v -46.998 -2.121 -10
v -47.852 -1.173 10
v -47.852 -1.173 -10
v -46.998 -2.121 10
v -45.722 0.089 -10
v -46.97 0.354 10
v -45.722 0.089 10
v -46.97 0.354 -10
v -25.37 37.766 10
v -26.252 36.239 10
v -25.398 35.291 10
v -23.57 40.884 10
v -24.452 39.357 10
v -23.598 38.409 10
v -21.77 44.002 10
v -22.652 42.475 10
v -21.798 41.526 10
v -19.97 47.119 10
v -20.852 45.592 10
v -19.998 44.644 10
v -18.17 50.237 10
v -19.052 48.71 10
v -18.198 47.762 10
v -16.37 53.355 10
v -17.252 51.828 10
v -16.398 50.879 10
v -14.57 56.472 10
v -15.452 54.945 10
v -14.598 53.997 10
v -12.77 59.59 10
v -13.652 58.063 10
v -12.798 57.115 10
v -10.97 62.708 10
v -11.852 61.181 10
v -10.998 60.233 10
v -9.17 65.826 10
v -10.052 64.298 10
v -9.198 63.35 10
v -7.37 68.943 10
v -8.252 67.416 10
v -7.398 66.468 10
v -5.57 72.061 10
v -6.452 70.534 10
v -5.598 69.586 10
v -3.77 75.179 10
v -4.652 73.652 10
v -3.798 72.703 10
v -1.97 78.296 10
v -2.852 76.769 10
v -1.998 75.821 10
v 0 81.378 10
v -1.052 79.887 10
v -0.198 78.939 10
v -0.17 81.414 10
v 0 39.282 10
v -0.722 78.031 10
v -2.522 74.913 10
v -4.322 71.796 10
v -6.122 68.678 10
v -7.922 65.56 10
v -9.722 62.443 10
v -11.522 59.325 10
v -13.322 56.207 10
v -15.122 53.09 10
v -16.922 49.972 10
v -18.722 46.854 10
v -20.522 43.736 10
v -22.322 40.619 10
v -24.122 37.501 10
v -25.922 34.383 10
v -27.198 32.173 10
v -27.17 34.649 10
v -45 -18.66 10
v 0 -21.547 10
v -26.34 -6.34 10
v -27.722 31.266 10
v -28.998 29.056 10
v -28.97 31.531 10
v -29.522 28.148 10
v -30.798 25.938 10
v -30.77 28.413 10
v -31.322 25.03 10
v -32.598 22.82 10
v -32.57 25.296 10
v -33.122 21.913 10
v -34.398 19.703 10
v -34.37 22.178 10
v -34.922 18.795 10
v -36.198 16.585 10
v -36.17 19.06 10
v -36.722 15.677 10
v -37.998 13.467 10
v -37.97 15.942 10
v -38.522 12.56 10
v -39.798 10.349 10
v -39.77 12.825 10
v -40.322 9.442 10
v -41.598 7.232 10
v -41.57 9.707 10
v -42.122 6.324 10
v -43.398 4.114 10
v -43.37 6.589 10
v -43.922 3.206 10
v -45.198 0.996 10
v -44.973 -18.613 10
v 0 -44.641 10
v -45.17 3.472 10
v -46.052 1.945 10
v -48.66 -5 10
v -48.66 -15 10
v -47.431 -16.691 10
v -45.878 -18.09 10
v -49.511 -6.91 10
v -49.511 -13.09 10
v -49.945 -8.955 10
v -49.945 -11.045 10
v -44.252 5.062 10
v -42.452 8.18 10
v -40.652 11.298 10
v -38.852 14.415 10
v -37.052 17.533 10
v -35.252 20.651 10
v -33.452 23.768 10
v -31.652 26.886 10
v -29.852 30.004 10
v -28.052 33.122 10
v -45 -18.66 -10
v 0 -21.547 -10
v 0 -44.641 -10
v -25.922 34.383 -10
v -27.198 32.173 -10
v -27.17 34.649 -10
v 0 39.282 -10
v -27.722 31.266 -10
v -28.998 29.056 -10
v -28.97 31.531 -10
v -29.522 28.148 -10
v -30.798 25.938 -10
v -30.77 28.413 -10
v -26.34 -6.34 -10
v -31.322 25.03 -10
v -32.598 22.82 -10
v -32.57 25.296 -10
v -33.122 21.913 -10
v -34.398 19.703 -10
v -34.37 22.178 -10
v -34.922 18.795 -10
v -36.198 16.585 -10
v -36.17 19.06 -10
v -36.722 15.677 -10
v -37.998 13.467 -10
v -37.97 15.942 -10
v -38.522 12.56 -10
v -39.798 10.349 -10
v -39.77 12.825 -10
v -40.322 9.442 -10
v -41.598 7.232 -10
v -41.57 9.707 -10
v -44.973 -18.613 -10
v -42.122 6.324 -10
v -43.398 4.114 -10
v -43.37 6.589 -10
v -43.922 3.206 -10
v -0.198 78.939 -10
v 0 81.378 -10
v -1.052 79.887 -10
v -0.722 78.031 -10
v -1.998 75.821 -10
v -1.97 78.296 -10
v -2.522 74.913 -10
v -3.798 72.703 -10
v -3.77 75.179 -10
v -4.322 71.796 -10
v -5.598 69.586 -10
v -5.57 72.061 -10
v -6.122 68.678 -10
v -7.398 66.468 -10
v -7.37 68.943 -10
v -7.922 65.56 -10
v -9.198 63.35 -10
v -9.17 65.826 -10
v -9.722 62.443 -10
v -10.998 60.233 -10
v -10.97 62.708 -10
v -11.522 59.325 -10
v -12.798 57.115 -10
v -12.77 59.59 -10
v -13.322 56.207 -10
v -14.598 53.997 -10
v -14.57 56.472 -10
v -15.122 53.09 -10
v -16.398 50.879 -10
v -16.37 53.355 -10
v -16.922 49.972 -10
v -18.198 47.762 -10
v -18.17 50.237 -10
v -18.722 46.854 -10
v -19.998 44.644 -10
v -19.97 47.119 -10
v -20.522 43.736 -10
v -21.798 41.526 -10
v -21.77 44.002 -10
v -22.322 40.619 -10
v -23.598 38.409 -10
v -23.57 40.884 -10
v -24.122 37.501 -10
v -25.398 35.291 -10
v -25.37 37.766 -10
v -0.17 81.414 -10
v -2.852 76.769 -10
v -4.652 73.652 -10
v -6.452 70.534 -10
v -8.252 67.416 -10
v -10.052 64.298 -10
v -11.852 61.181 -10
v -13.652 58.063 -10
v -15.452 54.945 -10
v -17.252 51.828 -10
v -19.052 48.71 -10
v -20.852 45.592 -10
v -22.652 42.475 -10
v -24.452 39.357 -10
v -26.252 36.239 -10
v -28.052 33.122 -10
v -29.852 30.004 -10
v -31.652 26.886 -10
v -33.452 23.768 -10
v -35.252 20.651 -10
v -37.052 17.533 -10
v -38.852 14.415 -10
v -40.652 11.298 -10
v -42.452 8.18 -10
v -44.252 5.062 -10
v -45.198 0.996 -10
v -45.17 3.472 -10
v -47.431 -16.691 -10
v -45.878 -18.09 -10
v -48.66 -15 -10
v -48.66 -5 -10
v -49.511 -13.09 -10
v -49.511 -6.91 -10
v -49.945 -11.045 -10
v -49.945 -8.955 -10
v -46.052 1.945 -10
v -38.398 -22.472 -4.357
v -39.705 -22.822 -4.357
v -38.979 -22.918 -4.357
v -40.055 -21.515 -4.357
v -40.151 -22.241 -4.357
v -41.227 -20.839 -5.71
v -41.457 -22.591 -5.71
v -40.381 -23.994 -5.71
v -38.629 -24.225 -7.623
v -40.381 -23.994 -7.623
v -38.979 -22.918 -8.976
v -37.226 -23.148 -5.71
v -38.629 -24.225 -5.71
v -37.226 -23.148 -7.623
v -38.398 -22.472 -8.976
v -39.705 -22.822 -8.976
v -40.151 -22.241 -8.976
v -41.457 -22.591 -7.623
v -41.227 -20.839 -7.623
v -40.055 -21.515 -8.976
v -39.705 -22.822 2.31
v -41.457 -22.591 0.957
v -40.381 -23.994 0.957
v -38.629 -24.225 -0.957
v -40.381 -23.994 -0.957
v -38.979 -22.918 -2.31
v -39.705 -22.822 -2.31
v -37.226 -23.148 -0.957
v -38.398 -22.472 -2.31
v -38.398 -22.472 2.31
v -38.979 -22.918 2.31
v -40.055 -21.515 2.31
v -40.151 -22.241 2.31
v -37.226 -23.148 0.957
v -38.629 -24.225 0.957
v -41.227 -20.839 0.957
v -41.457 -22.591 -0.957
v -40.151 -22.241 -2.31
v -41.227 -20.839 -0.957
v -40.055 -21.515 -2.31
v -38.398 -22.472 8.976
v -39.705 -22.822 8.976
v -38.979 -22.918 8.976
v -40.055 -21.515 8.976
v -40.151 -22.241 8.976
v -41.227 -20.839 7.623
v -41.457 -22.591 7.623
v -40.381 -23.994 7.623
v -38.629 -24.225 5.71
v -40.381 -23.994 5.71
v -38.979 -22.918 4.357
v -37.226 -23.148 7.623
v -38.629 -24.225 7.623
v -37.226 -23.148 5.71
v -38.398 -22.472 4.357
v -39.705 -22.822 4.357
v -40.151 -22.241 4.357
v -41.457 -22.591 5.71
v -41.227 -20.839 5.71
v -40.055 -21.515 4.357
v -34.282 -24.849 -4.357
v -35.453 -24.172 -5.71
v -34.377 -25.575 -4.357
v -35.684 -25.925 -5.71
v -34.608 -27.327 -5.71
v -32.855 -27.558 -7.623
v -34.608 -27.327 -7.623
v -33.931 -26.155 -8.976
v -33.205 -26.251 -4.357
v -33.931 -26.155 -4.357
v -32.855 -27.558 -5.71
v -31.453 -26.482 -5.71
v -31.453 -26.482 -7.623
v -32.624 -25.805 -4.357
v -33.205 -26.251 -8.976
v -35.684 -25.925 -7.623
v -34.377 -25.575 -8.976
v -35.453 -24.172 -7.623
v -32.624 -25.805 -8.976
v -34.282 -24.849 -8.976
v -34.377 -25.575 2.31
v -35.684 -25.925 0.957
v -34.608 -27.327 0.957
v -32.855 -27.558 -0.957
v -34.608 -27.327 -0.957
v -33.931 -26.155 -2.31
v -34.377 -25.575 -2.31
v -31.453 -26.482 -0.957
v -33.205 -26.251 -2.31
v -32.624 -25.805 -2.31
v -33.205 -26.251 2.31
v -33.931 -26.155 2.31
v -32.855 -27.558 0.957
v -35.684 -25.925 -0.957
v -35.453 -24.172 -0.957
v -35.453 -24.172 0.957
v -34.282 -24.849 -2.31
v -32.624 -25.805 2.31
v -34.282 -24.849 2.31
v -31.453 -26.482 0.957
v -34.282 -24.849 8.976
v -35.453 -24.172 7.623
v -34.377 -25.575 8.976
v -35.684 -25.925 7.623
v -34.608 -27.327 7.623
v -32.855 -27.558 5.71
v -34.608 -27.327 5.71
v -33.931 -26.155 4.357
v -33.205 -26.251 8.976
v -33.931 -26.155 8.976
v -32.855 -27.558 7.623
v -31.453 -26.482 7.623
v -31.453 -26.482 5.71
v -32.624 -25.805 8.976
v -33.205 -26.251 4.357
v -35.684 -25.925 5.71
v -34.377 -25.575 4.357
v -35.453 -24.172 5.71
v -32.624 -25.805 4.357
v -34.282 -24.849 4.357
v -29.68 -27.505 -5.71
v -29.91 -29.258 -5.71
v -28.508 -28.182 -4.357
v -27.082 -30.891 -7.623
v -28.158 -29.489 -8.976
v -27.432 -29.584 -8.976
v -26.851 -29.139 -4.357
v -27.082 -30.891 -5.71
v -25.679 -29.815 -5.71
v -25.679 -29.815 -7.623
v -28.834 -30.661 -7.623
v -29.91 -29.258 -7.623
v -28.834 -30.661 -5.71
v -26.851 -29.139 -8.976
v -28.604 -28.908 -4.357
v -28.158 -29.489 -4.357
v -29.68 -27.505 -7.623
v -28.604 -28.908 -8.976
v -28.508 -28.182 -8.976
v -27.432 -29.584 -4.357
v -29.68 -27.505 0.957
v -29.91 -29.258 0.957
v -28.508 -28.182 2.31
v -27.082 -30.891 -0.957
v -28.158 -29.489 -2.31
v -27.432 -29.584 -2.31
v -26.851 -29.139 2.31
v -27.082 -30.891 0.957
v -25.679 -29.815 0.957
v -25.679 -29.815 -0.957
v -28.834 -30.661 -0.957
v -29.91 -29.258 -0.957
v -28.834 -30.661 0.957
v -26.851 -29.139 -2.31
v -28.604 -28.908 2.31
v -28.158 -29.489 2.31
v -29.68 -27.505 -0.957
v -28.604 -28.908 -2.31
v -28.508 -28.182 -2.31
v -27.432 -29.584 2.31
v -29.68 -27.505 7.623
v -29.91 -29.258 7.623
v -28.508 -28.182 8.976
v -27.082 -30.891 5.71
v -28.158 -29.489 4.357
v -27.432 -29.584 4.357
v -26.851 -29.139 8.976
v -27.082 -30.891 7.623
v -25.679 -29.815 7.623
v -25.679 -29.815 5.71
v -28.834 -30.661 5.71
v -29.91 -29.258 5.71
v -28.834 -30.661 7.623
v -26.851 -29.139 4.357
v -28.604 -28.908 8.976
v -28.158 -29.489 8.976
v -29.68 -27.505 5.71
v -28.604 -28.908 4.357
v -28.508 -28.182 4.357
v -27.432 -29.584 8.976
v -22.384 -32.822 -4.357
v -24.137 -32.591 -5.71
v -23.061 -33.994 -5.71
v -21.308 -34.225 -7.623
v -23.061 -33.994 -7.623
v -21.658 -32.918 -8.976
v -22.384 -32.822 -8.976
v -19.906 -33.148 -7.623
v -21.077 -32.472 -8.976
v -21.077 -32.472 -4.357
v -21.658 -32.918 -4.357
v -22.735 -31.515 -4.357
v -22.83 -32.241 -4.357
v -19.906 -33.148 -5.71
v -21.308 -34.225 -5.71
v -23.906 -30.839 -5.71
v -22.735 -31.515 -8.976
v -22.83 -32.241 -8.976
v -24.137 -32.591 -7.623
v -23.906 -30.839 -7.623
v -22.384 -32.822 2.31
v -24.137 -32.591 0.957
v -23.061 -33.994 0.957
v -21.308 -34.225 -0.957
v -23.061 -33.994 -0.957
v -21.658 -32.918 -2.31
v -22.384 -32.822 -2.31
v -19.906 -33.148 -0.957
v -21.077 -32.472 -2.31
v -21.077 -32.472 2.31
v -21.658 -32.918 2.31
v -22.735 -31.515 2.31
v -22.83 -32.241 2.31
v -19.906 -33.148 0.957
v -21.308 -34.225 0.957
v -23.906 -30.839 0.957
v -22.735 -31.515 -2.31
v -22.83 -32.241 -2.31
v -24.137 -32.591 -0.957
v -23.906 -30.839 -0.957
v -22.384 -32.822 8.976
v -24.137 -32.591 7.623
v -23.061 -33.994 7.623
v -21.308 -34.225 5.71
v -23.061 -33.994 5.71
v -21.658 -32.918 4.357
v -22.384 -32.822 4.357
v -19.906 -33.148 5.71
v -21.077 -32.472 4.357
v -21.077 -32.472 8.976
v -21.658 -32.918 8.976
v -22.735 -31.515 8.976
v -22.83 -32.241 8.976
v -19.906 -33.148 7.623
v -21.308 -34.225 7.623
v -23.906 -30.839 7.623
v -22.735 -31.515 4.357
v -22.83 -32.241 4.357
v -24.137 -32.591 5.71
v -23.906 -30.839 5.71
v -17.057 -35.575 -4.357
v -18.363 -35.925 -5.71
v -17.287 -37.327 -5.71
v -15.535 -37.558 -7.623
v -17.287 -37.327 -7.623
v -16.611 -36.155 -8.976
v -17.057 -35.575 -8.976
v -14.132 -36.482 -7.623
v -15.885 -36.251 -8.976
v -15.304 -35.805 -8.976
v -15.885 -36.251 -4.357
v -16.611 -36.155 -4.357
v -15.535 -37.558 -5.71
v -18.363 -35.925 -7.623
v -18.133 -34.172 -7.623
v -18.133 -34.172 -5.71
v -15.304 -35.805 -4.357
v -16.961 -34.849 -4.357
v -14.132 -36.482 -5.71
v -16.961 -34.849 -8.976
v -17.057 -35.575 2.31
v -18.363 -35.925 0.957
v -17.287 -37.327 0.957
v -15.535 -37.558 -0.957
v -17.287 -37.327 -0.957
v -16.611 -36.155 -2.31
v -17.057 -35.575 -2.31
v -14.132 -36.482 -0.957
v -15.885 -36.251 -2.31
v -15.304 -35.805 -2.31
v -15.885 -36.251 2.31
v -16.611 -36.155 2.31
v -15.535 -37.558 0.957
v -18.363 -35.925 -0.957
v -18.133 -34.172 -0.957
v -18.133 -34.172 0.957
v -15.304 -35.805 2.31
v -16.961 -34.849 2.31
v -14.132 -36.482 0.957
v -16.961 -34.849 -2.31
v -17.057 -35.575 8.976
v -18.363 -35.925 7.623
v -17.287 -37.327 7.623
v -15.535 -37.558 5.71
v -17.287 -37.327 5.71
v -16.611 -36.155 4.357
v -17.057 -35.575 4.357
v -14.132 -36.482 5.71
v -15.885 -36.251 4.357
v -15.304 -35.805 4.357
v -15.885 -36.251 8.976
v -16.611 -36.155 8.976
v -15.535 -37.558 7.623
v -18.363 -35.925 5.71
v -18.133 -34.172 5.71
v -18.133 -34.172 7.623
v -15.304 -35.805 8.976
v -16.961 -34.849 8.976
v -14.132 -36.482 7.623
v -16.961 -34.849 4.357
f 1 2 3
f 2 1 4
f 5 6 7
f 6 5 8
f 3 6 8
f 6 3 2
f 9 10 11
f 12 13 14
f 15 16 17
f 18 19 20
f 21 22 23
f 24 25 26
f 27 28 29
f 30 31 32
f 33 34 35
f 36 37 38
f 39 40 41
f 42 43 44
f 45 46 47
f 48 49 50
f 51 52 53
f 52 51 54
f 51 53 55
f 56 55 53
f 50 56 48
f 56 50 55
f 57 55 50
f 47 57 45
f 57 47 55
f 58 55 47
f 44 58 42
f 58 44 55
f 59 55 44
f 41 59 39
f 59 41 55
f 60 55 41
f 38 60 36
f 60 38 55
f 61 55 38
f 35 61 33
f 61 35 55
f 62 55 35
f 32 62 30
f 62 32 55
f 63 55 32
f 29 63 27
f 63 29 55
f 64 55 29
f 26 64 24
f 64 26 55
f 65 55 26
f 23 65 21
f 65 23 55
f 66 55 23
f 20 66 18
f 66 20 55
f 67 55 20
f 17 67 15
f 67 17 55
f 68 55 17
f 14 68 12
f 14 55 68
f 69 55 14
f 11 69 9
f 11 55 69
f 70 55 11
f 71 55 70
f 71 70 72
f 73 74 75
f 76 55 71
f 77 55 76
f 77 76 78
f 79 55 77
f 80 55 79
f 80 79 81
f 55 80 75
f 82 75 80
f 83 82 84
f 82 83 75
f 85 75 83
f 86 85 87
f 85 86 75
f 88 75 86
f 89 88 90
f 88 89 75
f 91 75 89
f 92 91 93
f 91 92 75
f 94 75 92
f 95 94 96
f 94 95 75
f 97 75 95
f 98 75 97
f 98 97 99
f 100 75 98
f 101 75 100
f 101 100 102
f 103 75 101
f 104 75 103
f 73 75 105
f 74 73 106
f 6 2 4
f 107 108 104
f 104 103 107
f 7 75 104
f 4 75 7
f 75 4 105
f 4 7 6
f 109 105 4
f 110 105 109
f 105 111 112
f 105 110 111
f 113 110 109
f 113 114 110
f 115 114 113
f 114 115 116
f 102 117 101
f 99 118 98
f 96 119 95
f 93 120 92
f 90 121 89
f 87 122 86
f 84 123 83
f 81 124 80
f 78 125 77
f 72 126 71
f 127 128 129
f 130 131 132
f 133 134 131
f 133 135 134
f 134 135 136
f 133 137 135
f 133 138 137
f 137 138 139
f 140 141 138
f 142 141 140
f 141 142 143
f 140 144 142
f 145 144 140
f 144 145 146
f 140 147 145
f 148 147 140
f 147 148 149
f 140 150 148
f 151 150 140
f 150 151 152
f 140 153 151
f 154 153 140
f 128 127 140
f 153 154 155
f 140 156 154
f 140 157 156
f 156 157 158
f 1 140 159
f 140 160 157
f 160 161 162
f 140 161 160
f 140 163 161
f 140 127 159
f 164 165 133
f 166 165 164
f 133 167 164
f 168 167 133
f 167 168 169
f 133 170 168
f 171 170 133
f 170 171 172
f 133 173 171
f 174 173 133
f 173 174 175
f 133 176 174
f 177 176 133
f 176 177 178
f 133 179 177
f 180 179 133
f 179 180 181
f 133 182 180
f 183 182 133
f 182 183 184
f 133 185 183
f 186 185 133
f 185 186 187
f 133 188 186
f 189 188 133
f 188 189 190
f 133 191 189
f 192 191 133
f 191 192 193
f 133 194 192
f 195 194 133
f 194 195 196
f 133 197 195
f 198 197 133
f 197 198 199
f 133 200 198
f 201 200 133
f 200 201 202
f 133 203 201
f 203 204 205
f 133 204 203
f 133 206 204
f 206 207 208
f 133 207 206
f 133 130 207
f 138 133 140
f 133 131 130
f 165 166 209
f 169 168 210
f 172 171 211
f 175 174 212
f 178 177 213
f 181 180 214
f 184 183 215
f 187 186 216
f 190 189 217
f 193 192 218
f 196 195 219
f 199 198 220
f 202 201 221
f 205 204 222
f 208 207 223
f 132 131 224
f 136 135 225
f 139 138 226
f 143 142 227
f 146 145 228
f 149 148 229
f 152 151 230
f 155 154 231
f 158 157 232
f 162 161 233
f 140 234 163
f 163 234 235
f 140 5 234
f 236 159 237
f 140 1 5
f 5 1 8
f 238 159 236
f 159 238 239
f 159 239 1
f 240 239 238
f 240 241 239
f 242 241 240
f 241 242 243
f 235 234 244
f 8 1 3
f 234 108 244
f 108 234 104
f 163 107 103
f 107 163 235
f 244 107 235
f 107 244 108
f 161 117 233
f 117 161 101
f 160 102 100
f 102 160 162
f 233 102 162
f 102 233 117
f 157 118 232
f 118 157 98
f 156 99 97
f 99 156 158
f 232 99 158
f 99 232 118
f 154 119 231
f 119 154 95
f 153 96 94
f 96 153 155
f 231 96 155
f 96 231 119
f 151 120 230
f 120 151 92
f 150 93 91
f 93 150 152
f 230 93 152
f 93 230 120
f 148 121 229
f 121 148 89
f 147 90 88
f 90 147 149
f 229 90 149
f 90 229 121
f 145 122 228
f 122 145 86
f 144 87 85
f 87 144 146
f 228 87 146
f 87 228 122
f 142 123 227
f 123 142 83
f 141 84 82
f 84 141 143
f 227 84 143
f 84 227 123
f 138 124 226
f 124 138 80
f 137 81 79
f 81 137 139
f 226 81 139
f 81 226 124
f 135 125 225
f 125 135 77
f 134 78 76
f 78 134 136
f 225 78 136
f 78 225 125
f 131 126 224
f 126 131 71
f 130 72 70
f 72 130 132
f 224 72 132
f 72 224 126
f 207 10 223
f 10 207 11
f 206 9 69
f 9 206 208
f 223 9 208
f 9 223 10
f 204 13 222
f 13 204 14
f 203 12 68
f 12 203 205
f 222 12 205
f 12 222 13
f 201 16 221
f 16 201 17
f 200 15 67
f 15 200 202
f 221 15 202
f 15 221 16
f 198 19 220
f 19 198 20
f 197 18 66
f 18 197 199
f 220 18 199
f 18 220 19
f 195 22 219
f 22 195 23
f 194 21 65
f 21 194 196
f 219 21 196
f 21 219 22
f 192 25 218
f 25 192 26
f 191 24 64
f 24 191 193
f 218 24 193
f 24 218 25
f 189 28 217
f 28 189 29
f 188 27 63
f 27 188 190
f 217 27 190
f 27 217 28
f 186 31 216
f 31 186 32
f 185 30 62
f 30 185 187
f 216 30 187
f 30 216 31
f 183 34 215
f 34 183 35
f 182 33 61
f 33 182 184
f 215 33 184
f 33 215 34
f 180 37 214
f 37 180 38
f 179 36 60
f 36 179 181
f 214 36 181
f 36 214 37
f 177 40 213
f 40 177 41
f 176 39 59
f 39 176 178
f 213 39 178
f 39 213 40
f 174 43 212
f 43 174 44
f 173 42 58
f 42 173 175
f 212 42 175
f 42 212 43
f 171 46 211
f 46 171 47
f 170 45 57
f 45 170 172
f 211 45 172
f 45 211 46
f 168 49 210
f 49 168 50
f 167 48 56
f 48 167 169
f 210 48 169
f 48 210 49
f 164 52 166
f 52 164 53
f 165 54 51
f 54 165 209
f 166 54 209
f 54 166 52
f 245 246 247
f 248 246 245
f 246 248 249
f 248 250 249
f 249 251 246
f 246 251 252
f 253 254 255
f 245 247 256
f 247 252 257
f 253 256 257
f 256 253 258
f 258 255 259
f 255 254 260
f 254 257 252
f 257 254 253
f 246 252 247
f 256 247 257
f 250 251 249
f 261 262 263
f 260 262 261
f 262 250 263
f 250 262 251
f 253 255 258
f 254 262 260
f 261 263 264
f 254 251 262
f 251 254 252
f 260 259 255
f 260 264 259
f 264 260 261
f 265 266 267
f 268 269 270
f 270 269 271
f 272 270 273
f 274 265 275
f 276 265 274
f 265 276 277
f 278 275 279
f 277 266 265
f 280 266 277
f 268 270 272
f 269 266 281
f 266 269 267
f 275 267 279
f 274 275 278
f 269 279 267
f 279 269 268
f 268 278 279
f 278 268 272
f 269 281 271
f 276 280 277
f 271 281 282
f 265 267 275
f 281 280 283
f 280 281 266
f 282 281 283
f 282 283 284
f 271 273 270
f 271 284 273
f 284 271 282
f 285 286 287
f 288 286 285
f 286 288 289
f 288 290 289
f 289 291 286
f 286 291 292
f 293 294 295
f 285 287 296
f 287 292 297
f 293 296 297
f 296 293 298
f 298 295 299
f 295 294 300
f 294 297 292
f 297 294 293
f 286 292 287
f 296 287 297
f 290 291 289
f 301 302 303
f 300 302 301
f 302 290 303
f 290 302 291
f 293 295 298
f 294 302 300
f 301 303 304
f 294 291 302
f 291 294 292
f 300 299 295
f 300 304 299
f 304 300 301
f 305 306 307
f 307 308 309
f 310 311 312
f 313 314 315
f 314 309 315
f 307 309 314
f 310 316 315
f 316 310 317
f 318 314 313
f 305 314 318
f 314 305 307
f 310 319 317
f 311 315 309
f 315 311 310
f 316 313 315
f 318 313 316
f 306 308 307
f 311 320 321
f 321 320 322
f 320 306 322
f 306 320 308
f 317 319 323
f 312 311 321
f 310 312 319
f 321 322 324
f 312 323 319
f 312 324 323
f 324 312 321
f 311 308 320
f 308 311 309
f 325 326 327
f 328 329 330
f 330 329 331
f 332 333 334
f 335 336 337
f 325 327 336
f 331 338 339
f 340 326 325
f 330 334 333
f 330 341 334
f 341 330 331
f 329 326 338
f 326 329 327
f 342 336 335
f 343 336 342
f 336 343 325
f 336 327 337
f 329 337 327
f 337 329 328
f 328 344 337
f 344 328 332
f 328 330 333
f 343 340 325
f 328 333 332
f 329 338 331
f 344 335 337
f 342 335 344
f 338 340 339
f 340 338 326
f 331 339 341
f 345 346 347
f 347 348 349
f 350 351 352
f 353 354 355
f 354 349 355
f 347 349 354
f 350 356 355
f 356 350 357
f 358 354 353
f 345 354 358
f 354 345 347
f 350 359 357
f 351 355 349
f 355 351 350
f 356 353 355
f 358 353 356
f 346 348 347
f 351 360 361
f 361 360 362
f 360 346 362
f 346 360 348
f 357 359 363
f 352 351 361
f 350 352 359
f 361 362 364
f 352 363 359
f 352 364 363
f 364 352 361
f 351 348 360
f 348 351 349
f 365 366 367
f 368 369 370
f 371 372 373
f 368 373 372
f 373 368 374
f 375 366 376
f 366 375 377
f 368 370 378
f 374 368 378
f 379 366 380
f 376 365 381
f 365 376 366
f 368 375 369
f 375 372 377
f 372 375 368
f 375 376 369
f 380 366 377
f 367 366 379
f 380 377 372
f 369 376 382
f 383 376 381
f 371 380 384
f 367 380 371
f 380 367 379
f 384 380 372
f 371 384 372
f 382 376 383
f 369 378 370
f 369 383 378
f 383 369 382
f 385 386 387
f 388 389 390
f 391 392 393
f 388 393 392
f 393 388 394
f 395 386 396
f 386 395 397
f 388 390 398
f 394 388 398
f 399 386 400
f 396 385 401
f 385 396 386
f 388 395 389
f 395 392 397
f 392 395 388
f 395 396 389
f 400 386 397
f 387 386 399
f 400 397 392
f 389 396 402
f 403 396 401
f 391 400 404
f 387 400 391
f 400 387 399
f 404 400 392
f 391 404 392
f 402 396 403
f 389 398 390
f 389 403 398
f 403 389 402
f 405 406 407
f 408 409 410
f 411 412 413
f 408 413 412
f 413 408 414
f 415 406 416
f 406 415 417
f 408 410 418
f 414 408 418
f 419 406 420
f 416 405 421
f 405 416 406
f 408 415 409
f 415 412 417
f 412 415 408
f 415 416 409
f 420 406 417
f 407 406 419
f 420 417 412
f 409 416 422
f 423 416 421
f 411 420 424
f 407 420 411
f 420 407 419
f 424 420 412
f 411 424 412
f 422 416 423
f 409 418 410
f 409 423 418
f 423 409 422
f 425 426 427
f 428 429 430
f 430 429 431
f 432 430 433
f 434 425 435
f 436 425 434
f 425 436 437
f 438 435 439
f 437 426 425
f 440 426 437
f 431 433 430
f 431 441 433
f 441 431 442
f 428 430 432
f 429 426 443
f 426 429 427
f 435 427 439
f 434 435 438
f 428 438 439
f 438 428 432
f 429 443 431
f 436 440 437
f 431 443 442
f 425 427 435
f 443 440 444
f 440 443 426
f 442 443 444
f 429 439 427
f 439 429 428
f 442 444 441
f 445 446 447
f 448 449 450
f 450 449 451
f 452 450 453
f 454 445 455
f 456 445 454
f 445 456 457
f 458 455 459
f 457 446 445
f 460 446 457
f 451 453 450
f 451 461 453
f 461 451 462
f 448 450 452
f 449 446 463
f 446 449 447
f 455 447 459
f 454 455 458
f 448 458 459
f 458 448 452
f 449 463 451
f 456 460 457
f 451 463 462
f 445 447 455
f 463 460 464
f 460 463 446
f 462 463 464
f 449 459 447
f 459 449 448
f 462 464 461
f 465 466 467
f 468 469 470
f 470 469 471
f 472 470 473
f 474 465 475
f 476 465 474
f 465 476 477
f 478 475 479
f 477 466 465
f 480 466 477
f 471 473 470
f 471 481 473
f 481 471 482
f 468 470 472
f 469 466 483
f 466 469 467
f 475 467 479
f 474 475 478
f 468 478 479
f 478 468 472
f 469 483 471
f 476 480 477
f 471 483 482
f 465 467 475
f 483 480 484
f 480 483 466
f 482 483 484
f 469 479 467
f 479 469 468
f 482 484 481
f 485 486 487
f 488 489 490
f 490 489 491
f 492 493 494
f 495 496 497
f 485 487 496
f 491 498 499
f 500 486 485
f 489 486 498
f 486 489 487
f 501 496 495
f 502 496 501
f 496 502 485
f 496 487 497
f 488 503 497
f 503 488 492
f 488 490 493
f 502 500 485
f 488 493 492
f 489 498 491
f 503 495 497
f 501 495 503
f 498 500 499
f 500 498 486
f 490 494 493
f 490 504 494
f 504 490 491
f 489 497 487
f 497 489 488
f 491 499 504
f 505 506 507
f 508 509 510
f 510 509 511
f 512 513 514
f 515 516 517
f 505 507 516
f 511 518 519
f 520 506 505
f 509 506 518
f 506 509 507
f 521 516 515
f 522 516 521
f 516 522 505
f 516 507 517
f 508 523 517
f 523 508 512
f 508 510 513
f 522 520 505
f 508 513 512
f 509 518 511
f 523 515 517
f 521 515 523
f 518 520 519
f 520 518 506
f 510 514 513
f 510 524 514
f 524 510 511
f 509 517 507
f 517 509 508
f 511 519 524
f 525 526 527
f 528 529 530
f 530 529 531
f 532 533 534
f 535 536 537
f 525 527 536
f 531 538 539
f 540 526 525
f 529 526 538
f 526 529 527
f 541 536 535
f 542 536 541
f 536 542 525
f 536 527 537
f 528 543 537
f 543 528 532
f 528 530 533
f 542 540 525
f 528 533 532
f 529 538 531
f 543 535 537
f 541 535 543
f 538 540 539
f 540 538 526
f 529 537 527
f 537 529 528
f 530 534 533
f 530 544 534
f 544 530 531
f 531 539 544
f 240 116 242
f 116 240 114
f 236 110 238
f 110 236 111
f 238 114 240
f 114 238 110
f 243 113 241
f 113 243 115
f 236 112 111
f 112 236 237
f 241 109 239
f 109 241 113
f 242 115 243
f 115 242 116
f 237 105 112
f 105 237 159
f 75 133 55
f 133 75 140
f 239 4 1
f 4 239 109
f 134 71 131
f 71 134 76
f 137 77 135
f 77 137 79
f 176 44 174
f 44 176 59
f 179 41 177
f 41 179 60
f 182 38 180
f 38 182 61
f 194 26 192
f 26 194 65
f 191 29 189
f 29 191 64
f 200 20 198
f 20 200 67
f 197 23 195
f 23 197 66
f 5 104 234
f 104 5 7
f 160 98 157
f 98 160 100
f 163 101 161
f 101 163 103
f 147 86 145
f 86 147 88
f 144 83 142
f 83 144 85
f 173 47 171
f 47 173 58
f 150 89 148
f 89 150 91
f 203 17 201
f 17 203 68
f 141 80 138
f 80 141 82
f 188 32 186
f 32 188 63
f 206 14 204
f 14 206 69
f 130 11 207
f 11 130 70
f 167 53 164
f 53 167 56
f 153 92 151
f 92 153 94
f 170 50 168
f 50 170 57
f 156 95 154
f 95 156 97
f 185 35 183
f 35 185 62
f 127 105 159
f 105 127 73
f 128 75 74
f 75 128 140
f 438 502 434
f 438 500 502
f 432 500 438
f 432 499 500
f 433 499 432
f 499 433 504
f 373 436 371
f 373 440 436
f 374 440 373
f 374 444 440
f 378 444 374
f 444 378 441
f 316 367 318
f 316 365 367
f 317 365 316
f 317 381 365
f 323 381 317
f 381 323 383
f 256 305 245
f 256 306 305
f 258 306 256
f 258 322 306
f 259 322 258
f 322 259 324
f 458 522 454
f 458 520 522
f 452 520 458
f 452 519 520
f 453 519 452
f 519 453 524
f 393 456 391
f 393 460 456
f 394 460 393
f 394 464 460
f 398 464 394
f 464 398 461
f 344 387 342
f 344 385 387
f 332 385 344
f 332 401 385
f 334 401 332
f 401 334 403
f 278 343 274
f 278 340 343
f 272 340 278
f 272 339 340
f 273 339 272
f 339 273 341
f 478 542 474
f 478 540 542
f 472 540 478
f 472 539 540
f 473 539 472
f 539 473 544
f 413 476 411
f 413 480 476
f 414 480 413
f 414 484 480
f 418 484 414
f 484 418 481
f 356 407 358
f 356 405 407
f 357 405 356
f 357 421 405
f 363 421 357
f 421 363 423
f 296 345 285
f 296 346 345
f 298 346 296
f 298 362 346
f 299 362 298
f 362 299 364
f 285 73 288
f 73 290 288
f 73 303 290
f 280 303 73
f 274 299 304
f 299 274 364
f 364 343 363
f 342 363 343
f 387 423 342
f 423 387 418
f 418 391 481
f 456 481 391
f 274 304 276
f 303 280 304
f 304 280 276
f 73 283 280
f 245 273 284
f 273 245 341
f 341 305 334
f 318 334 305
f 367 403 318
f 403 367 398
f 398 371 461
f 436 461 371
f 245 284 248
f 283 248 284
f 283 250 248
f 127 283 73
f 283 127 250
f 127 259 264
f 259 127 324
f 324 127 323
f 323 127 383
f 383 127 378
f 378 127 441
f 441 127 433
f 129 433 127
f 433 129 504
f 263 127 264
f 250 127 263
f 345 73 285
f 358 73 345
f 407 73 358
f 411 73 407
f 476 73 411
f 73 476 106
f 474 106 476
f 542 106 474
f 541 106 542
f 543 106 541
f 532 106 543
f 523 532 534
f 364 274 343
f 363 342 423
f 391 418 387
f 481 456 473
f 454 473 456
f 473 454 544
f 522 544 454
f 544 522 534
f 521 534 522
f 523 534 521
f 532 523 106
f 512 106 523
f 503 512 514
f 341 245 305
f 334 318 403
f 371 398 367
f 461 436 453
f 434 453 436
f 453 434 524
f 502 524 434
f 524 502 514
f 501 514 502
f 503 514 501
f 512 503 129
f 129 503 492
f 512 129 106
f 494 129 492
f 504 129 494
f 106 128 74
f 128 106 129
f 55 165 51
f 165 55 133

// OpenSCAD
// [FL_INDEX: keywords="openscad, 3d_parametric, Customizable_Door_Stop, csg_solid" | COT="Parametric OpenSCAD design from 3DCodeverse"]
// Title: Customizable Door Stop

widgetWidth = 20; // [15:40]
widgetThickness = 20; // [15:50]
widgetHeight = 50; // [40:70]
stepSize = 3; // [2:5]

module theL(theWidth, theThickness, theHeight, theStep) {
  cylinder(h=theWidth, r=theThickness/2, center=true);
  translate(v=[0, 80, 0]) cube(size=[theThickness, 160, theWidth], center=true);  // long side
  translate(v=[60, 0, 0]) cube(size=[120, theThickness, theWidth], center=true);   // short side

  for (i = [1:55]) {
    translate(v=[-1*theThickness/2, i*theStep*1.2+1, 0]) cylinder(h=theWidth, r=theStep/2, center=true);
  }

  for (i = [1:5]) {
    translate(v=[i*theWidth/3, -1*theThickness/2, -1*theWidth/3]) sphere(r = theWidth/8);
    translate(v=[i*theWidth/3, -1*theThickness/2, 0]) sphere(r = theWidth/8);
    translate(v=[i*theWidth/3, -1*theThickness/2, 1*theWidth/3]) sphere(r = theWidth/8);
  }
}

 
difference() {
  translate(v=[widgetThickness/2-widgetHeight, -0.5*widgetThickness, 0]) rotate([0, 0, -30]) theL(widgetWidth, widgetThickness, widgetHeight, stepSize);
  translate(v=[200, 50, 0]) cube(size=[400, 800, 100], center=true);
}


// preview[view:south west, tilt:top diagonal]
